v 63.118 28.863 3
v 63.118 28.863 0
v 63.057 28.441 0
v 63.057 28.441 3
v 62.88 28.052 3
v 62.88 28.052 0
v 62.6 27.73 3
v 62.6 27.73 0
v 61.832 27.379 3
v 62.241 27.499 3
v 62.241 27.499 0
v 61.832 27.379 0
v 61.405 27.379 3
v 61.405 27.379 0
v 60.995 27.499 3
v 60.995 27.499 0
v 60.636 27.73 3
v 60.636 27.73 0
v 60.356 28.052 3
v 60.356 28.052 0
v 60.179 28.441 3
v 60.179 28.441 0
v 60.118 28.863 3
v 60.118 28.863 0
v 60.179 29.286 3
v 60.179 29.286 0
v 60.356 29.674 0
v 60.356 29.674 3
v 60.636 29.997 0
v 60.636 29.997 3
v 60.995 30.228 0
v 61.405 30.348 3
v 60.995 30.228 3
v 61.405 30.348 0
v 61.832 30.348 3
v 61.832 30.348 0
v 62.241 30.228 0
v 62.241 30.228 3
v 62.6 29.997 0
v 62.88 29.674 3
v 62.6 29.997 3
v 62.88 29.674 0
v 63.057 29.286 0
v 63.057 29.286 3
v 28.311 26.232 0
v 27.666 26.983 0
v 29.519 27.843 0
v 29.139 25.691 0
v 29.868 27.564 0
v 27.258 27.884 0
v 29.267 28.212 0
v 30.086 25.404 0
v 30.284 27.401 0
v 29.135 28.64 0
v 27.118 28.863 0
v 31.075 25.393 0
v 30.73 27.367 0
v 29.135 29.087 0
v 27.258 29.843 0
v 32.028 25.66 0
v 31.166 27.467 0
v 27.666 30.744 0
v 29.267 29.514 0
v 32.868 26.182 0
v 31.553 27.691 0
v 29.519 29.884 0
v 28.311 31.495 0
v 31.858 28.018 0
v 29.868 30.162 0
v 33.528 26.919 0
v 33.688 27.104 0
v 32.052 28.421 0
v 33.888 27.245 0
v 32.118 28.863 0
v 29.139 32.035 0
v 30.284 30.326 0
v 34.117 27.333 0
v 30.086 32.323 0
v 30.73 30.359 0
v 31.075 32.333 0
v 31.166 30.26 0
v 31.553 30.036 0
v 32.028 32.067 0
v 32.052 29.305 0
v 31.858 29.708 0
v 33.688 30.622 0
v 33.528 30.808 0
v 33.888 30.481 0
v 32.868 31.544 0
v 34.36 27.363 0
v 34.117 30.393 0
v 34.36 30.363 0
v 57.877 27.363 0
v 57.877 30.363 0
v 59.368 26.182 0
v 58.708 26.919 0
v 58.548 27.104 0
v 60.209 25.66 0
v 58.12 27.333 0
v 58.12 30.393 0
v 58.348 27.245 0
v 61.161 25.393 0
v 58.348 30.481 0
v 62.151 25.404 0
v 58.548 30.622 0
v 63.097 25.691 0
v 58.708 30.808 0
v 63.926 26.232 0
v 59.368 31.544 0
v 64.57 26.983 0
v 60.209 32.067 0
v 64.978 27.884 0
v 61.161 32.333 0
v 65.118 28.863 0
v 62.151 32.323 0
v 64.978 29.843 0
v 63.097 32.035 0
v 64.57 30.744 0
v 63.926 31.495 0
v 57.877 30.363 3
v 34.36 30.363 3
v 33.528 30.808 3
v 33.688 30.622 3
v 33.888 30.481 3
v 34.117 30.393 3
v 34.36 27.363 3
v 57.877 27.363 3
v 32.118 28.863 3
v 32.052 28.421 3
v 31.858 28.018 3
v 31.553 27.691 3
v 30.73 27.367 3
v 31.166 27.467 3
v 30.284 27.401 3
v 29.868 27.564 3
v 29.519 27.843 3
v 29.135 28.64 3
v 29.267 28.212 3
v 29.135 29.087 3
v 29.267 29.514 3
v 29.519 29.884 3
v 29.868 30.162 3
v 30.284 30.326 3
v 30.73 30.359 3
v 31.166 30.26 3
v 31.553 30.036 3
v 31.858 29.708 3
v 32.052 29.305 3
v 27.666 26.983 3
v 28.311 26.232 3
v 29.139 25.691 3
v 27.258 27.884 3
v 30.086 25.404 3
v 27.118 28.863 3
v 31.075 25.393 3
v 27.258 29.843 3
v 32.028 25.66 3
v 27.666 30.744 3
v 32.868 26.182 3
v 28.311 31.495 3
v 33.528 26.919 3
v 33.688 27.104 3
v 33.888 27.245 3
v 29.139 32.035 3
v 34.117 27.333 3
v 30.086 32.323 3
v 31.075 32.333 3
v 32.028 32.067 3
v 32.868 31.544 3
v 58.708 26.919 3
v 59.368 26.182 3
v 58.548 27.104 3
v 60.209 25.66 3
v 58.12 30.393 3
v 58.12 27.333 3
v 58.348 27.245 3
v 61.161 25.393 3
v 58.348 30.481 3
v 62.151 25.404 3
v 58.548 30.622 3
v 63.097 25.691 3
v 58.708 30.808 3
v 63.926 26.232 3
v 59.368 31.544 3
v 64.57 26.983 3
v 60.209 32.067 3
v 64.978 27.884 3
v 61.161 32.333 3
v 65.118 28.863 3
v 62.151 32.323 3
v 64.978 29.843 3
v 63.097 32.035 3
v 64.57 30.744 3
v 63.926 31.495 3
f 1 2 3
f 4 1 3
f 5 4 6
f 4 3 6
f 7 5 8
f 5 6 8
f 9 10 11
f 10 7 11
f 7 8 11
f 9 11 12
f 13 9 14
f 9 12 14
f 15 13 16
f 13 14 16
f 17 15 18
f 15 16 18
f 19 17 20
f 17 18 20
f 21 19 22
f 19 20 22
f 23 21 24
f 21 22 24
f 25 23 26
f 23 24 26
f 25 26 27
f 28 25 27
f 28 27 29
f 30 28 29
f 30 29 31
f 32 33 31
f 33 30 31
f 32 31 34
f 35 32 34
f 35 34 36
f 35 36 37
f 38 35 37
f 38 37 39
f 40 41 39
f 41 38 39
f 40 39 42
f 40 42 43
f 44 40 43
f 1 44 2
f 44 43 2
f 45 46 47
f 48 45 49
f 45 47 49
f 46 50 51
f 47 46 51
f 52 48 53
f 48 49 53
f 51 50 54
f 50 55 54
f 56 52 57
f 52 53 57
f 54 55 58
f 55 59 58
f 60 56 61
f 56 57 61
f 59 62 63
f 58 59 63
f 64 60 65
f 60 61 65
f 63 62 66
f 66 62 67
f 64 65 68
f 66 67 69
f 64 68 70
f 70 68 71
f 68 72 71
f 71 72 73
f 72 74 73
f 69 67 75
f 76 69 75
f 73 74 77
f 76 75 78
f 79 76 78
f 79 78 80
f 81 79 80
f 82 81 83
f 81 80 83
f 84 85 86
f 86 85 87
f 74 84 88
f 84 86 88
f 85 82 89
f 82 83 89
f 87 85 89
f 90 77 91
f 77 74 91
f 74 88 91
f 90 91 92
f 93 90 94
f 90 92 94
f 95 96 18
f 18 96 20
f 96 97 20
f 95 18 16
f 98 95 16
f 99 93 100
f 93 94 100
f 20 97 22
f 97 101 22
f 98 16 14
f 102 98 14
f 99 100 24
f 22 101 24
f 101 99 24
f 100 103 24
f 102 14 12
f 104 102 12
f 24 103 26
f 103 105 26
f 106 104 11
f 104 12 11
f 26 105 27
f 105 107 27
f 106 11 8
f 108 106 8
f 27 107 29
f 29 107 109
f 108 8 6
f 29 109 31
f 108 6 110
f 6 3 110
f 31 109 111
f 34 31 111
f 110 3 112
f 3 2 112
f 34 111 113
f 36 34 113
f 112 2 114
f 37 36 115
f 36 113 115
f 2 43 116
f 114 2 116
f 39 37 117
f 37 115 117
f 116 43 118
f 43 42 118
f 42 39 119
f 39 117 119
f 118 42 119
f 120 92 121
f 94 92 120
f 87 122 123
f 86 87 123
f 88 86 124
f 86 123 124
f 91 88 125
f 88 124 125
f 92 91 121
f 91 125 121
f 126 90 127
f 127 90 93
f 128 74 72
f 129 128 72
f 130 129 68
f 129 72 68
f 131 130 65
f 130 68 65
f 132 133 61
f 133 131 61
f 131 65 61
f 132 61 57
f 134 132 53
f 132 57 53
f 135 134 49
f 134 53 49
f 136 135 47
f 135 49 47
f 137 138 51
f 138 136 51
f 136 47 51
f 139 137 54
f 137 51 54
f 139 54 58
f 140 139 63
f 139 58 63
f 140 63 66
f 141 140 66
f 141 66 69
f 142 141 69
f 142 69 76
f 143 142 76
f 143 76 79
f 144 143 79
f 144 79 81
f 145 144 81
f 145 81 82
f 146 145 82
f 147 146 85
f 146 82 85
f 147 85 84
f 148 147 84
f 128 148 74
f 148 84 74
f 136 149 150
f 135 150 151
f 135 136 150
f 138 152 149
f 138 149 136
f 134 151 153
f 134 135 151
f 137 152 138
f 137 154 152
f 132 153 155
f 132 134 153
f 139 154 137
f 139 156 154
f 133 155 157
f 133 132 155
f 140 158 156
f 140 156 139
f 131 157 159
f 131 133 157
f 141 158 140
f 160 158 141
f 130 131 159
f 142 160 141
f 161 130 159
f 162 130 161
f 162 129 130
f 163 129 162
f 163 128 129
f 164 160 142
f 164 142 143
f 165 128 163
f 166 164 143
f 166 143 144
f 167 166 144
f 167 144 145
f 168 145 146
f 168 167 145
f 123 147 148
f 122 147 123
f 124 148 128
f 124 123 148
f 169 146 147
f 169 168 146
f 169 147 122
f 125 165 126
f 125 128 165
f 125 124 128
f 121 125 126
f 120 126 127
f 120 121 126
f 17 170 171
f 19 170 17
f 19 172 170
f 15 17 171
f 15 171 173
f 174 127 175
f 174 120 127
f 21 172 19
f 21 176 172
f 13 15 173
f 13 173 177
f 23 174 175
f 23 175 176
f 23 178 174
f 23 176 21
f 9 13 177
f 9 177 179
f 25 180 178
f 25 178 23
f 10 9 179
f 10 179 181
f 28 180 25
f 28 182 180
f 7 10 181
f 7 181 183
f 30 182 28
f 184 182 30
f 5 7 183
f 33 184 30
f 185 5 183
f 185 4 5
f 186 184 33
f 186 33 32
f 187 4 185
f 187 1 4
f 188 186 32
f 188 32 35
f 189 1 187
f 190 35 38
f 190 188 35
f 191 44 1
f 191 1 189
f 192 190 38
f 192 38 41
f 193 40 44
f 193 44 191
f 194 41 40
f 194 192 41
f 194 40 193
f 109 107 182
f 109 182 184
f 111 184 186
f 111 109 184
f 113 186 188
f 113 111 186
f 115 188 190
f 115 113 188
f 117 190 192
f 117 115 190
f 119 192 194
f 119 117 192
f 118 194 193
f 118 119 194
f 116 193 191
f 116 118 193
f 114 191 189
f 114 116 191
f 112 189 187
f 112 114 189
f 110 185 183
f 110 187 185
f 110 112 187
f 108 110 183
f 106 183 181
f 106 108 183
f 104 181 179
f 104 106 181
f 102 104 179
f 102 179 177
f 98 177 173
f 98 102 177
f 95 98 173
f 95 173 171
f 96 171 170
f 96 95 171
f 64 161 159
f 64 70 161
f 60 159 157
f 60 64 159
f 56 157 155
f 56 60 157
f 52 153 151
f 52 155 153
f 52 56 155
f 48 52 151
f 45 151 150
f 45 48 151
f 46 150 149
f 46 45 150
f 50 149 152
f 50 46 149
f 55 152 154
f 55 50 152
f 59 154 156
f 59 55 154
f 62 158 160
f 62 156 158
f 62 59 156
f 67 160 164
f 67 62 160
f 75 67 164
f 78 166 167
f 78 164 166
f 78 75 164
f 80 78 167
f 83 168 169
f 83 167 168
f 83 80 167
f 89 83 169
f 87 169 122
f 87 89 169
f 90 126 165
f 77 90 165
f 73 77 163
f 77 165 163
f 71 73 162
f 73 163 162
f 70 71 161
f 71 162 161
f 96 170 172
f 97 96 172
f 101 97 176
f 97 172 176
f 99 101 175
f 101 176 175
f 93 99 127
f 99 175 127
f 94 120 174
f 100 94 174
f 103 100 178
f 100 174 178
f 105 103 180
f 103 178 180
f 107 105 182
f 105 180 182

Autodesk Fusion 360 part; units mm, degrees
sketch "Sketch1" plane through (0, 0, 0) normal (0, 0, 1) x (1, 0, 0)
  circle A0 centre (30.6182, 28.8633) radius 1.5
  circle A1 centre (30.6182, 28.8633) radius 3.5
  circle A2 centre (61.6182, 28.8633) radius 1.5
  circle A3 centre (61.6182, 28.8633) radius 3.5
  line L0 (30.6182, 28.8633) -> (61.6182, 28.8633)
  line L1 (33.7805, 30.3633) -> (59, 30.3633)
  line L2 (33.7805, 27.3633) -> (59, 27.3633)
  dimension "d1" = 3
  dimension "d2" = 7
  dimension "d3" = 3
  dimension "d4" = 7
  dimension "d5" = 31
  dimension "d6" = 1.5
extrude "Extrude1" add sketch "Sketch1" along normal blind 3
fillet "Fillet1" radius 1 4 edges at (33.7805, 30.3633, 1.5) (58.456, 30.3633, 1.5) (33.7805, 27.3633, 1.5) (58.456, 27.3633, 1.5)
